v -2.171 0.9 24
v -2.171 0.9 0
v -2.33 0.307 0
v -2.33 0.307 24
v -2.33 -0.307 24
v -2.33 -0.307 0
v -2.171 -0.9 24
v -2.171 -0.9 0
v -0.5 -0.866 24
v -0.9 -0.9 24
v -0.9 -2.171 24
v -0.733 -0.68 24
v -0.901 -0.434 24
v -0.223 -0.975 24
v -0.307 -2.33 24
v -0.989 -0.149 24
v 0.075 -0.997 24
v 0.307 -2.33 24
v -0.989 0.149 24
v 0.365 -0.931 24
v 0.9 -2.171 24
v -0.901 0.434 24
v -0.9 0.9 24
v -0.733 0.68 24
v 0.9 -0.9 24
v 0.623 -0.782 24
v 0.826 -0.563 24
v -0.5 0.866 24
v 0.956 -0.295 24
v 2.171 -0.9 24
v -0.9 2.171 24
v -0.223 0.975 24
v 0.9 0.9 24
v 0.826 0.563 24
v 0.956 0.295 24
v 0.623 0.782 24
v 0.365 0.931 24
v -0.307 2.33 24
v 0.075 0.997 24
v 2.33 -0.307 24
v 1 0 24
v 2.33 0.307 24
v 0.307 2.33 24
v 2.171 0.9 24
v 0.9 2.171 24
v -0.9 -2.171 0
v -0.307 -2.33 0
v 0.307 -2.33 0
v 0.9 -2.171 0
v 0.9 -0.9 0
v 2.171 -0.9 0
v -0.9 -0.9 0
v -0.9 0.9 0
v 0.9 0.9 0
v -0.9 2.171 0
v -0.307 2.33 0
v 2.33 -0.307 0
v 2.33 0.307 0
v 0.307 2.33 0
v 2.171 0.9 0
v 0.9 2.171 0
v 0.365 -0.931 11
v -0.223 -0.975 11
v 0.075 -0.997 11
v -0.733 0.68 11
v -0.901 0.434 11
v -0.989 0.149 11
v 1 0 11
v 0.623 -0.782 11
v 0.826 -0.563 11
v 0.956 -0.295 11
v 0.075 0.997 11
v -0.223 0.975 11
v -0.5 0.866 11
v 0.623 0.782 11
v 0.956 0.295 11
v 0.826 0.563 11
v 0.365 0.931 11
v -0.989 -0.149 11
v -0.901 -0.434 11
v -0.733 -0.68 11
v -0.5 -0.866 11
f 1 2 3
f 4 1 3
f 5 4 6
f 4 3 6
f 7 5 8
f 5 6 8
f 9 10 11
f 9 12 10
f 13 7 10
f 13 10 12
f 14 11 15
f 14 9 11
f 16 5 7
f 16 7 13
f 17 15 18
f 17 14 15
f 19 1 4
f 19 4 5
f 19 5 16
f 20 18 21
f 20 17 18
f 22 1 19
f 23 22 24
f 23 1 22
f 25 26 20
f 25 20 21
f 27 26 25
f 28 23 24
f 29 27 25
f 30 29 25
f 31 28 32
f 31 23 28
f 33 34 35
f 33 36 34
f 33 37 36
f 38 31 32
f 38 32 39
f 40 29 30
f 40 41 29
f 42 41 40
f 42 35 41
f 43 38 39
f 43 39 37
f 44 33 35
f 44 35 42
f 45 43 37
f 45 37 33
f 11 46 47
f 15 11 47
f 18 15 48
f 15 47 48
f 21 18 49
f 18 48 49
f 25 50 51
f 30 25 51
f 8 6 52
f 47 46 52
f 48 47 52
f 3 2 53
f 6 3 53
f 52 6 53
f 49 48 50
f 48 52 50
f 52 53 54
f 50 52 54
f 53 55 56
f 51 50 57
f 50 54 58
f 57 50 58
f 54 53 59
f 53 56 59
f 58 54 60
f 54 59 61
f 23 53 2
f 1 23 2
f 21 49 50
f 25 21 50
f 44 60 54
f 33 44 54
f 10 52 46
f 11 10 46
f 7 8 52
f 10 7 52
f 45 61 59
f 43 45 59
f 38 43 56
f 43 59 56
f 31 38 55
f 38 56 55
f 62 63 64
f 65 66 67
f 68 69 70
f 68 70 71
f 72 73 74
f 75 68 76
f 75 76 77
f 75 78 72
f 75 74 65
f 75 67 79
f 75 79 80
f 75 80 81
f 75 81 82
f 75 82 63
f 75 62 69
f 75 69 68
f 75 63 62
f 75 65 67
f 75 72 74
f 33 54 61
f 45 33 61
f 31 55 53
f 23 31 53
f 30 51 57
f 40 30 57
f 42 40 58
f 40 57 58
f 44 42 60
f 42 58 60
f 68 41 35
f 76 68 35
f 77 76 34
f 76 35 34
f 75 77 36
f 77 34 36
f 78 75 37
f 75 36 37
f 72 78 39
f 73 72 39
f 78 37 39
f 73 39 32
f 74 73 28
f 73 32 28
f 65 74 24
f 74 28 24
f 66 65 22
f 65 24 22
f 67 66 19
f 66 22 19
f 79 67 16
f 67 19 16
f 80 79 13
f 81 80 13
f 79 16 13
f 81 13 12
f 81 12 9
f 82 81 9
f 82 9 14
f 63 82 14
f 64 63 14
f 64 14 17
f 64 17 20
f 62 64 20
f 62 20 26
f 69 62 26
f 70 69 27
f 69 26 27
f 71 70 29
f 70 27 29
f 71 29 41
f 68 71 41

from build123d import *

# Parameters (mm, degrees)
BOSS_EXTRUDE1_DEPTH = 24
SKETCH2_R           = 1
CUT_EXTRUDE1_DEPTH  = 13


with BuildPart() as part:
    # Sketch1 → Boss-Extrude1 (new body)
    with BuildSketch(Plane.XY):
        with BuildLine():
            Line((-0.9, 2.170829335), (-0.9, 0.9))
            Line((-0.9, 0.9), (-2.170829335, 0.9))
            ThreePointArc((-2.170829335, 0.9), (-2.35, 0), (-2.170829335, -0.9))
            Line((-2.170829335, -0.9), (-0.9, -0.9))
            Line((-0.9, -0.9), (-0.9, -2.170829335))
            ThreePointArc((-0.9, -2.170829335), (0, -2.35), (0.9, -2.170829335))
            Line((0.9, -2.170829335), (0.9, -0.9))
            Line((0.9, -0.9), (2.170829335, -0.9))
            ThreePointArc((2.170829335, -0.9), (2.35, 0), (2.170829335, 0.9))
            Line((2.170829335, 0.9), (0.9, 0.9))
            Line((0.9, 0.9), (0.9, 2.170829335))
            ThreePointArc((0.9, 2.170829335), (0, 2.35), (-0.9, 2.170829335))
        make_face()
    extrude(amount=BOSS_EXTRUDE1_DEPTH)

    # Sketch2 → Cut-Extrude1 (cut)
    with BuildSketch(Plane.XY.offset(24)):
        Circle(SKETCH2_R)
    extrude(amount=-CUT_EXTRUDE1_DEPTH, mode=Mode.SUBTRACT)


solid = part.part
